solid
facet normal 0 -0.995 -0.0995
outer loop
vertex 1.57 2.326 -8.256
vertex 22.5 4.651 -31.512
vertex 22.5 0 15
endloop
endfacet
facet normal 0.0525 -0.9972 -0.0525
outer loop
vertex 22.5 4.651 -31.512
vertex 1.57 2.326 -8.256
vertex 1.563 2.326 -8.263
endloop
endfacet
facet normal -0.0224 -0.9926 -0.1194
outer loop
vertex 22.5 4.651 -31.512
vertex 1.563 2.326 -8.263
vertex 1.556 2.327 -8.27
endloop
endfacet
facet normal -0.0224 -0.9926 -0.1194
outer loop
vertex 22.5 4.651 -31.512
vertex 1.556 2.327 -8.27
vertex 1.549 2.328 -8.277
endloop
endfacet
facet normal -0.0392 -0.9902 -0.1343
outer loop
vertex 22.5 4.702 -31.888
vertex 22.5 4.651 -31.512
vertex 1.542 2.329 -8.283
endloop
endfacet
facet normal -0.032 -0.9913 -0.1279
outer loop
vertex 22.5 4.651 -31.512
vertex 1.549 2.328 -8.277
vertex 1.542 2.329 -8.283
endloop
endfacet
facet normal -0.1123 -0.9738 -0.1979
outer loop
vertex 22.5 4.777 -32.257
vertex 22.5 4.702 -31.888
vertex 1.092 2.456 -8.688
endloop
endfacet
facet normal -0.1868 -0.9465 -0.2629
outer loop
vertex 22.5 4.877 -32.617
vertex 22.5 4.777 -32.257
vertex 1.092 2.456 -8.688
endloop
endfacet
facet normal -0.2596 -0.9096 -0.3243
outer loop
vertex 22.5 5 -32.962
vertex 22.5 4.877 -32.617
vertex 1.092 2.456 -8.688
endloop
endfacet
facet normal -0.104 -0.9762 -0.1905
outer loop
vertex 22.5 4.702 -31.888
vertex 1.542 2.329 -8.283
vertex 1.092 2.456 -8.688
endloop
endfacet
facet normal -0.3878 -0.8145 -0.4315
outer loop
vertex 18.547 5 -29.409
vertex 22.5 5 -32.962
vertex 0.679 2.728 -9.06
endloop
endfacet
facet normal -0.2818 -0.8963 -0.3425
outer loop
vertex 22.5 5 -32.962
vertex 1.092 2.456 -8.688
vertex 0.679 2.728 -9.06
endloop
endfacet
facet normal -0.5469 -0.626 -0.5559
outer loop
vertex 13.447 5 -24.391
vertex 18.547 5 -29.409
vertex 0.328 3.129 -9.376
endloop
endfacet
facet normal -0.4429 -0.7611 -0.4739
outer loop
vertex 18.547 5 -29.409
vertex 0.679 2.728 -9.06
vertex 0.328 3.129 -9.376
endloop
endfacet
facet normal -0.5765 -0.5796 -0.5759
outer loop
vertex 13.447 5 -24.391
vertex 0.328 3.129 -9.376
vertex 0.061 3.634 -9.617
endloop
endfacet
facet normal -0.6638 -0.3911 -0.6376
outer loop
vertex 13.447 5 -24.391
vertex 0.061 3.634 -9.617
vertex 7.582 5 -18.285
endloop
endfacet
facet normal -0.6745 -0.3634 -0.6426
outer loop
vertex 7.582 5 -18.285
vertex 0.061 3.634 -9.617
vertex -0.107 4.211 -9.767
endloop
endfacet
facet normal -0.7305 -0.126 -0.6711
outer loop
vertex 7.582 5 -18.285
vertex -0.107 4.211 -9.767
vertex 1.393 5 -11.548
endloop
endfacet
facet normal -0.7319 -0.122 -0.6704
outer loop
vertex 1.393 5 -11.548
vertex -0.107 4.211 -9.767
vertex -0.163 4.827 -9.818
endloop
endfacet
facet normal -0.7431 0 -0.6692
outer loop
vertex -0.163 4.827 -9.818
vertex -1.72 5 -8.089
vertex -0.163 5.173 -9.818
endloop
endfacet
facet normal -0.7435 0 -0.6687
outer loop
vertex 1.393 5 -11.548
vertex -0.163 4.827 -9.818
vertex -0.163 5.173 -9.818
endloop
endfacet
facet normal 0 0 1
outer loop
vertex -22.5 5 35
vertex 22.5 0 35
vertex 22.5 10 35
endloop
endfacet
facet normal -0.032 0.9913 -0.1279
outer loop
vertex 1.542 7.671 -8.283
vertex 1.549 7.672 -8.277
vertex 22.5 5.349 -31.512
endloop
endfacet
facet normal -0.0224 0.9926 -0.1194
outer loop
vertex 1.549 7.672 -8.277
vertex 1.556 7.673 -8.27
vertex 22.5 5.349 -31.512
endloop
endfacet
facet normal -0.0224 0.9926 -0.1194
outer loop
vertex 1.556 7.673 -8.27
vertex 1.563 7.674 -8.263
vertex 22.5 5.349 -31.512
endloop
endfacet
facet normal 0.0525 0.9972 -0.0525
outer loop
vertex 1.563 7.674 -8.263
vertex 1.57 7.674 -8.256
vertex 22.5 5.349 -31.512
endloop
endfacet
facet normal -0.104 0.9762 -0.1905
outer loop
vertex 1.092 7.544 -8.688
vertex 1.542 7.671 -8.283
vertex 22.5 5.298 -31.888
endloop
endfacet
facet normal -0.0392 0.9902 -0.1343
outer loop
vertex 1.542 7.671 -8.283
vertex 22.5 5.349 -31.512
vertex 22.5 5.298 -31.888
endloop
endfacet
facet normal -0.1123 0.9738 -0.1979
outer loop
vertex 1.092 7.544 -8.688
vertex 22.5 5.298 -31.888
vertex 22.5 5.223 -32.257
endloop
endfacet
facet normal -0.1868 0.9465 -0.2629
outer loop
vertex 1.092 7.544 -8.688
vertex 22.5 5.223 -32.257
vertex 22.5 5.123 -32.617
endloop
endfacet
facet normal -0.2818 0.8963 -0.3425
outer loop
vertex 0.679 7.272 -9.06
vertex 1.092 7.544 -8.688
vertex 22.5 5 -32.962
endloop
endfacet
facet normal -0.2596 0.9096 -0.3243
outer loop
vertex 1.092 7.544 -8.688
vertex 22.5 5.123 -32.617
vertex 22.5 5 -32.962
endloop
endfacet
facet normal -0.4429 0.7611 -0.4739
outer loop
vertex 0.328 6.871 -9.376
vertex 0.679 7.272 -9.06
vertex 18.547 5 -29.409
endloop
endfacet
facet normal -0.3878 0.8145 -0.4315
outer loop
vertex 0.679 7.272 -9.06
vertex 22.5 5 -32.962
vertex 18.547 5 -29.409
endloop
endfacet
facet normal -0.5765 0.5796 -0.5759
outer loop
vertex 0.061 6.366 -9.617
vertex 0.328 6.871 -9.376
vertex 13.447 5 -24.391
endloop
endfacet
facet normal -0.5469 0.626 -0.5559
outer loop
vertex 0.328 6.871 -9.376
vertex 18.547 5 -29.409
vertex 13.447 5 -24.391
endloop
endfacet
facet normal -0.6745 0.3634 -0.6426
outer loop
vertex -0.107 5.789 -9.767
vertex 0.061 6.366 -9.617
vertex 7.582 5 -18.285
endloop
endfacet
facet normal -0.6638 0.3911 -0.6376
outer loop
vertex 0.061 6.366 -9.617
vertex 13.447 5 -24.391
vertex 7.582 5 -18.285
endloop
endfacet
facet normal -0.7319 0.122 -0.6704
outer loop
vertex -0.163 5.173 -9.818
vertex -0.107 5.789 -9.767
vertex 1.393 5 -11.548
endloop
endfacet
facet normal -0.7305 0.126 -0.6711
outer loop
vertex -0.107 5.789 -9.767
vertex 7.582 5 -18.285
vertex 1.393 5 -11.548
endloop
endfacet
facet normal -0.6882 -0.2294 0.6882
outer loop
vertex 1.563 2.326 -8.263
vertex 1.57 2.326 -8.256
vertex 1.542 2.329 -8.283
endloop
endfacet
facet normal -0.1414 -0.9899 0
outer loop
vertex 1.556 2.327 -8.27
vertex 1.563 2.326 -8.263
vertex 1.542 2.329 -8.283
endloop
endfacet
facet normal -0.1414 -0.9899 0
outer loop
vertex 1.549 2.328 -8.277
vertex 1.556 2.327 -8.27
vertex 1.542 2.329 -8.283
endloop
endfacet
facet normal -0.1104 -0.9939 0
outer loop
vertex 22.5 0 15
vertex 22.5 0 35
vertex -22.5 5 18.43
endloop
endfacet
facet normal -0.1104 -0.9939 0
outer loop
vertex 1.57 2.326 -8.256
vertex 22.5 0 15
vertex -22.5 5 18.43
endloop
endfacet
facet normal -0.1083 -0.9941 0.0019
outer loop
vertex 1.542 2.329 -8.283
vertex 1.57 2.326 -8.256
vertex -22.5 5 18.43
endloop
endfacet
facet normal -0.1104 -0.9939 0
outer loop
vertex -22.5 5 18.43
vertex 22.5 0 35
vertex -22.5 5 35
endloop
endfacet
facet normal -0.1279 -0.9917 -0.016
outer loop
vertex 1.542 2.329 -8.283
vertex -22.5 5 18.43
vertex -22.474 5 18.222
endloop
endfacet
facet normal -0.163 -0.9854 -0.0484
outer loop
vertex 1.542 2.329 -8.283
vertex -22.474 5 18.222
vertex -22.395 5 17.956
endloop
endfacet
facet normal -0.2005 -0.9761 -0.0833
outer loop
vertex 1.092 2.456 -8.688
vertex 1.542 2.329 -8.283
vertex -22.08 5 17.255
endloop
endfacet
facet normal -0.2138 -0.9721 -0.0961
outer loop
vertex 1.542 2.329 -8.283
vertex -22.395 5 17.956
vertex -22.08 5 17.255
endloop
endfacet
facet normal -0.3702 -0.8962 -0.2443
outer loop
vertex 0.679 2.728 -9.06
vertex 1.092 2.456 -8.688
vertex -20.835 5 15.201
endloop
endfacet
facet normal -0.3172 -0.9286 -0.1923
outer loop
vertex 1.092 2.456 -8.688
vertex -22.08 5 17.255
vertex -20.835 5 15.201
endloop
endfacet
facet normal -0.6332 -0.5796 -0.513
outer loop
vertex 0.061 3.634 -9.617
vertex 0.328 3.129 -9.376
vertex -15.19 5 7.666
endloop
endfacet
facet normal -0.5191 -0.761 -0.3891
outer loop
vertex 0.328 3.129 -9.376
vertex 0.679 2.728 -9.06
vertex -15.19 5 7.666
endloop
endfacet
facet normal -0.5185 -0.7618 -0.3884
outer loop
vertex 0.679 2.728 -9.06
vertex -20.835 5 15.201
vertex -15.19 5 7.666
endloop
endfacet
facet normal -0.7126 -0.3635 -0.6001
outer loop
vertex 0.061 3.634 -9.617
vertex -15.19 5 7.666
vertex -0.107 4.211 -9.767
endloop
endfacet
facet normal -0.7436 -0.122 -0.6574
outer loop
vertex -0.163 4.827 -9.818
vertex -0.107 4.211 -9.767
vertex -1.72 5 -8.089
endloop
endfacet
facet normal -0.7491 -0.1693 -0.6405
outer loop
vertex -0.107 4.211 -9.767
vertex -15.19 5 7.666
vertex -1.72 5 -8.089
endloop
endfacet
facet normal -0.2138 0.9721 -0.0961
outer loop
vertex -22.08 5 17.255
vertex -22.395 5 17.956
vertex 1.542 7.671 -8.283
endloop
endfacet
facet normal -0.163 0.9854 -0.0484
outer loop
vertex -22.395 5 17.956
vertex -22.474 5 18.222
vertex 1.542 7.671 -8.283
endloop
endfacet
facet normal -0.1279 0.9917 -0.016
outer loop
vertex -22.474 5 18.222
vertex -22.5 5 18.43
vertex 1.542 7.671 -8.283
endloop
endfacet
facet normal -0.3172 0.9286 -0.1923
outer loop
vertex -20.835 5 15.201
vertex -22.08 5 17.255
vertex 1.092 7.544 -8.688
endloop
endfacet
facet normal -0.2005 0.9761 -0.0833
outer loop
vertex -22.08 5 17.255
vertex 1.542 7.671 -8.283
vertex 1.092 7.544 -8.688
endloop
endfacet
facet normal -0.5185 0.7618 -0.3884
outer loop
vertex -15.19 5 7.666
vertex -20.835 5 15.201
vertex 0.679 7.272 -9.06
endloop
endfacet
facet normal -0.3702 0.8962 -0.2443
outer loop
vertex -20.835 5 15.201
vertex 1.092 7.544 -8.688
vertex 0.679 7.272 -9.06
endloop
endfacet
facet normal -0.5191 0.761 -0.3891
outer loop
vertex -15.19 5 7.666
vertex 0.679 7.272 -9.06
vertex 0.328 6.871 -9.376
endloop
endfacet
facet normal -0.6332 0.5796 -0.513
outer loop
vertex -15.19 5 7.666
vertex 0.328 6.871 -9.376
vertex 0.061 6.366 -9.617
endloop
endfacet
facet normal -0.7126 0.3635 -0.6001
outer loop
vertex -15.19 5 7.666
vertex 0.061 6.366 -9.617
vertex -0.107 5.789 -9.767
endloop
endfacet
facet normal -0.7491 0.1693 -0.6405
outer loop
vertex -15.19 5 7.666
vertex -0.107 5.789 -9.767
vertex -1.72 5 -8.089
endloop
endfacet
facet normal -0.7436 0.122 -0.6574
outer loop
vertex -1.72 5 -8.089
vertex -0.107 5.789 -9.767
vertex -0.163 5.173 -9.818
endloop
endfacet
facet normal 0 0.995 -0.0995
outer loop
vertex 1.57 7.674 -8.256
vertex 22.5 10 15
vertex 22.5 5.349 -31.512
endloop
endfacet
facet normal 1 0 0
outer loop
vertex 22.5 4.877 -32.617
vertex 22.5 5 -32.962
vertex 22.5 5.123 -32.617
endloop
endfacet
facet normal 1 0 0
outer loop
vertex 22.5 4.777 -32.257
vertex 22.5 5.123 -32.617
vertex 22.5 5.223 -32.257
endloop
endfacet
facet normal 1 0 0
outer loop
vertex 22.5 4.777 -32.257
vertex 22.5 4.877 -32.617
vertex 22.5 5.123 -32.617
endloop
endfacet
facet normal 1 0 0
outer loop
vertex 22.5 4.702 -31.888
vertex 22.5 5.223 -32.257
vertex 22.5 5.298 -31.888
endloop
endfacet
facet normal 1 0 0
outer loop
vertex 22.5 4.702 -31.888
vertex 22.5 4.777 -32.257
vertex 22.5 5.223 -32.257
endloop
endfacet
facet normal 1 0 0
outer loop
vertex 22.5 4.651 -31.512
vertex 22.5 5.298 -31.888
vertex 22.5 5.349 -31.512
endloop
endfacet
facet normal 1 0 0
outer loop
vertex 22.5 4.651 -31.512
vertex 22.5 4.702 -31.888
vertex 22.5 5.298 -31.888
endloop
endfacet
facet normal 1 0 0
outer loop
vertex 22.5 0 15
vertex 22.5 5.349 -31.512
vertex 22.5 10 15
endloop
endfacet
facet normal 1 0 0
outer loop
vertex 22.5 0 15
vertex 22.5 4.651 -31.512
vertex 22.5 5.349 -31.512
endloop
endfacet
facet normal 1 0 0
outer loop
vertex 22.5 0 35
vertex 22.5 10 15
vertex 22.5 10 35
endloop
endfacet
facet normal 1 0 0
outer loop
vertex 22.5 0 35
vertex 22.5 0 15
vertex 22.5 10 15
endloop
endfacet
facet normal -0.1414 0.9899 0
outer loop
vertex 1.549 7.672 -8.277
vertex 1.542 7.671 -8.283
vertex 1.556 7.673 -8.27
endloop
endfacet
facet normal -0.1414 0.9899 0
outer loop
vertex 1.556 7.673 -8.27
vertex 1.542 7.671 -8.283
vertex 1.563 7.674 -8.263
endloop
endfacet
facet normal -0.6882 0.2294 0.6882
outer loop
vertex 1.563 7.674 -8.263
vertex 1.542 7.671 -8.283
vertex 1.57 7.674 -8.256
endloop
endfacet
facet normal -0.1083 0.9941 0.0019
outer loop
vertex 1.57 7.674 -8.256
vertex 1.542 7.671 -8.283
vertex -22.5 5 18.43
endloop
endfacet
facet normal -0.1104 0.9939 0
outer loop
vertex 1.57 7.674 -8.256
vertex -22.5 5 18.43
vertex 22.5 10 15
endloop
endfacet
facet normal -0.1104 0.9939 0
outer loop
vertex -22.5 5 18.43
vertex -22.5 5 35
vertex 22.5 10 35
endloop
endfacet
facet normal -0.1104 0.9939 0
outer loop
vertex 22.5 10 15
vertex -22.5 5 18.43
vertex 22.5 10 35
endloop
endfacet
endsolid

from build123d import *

# Parameters (mm, degrees)
BOSS_EXTRUDE1_DEPTH = 10
CUT_EXTRUDE1_DEPTH  = 58.879184514
CUT_EXTRUDE2_DEPTH  = 75.204110398
FILLET1_R           = 2.5


with BuildPart() as part:
    # Sketch1 → Boss-Extrude1 (new body)
    with BuildSketch(Plane(origin=(0, 0, 0), x_dir=(1, 0, 0), z_dir=(0, 1, 0))):
        Polygon((-22.5, -15), (22.5, 35), (22.5, -35), (-22.5, -35), align=None)
    extrude(amount=BOSS_EXTRUDE1_DEPTH)

    # Sketch2 → Cut-Extrude1 (cut, through all)
    with BuildSketch(Plane(origin=(22.5, 0, 0), x_dir=(0, 0, -1), z_dir=(1, 0, 0))):
        Polygon((35, 0), (35, 5), (-15, 0), align=None)
        Polygon((35, 10), (-15, 10), (35, 5), align=None)
    extrude(amount=-CUT_EXTRUDE1_DEPTH, mode=Mode.SUBTRACT)

    # Sketch3 → Cut-Extrude2 (cut, through all)
    with BuildSketch(Plane.XY.offset(35)):
        Polygon((-22.5, 10), (-22.5, 5), (22.5, 10), align=None)
        Polygon((-22.5, 0), (22.5, 0), (-22.5, 5), align=None)
    extrude(amount=-CUT_EXTRUDE2_DEPTH, mode=Mode.SUBTRACT)

    # Fillet1
    # the kernel refuses this fillet: 2.5 mm, written as the material it takes off along each edge
    with BuildSketch(Plane(origin=(-3.900636109, 2.066595988, -5.665959879), x_dir=(-0.049586965018551935, 0.9972489631508745, 0.0550966277983907), z_dir=(0.667124384994991, 0.07412493166611012, -0.7412493166611013)), Plane(origin=(26.400636109, 4.566595988, -39.334040121), x_dir=(-0.04958696501855178, -0.9972489631508747, 0.05509662779839086), z_dir=(-0.667124384994991, 0.07412493166611012, 0.7412493166611013))) as fillet1_piece_1:
        with BuildLine():
            CenterArc((FILLET1_R * 0.935510365796, FILLET1_R), FILLET1_R, 183.816685755, 86.183314245)
            Line((-FILLET1_R * 0.0622717598086, FILLET1_R * 0.93343552131), (0, 0))
            Line((0, 0), (FILLET1_R * 0.935510365796, 0))
        make_face()
    extrude(amount=45.420723481, mode=Mode.SUBTRACT)
    with BuildSketch(Plane(origin=(3.840238573, 7.926693175, -14.266931748), x_dir=(0.04958696501855149, -0.9972489631508746, -0.05509662779839123), z_dir=(-0.6671243849949912, -0.07412493166611021, 0.7412493166611013)), Plane(origin=(-26.340238573, 5.426693175, 19.266931748), x_dir=(0.04958696501855112, 0.9972489631508746, -0.05509662779839134), z_dir=(0.6671243849949912, -0.07412493166611005, -0.7412493166611013))) as fillet1_piece_2:
        with BuildLine():
            CenterArc((FILLET1_R * 0.921024902586, FILLET1_R), FILLET1_R, 184.708312873, 85.291687127)
            Line((-FILLET1_R * 0.0756005855297, FILLET1_R * 0.917916893107), (0, 0))
            Line((0, 0), (FILLET1_R * 0.921024902586, 0))
        make_face()
    extrude(amount=45.23965519, mode=Mode.SUBTRACT)


solid = part.part
